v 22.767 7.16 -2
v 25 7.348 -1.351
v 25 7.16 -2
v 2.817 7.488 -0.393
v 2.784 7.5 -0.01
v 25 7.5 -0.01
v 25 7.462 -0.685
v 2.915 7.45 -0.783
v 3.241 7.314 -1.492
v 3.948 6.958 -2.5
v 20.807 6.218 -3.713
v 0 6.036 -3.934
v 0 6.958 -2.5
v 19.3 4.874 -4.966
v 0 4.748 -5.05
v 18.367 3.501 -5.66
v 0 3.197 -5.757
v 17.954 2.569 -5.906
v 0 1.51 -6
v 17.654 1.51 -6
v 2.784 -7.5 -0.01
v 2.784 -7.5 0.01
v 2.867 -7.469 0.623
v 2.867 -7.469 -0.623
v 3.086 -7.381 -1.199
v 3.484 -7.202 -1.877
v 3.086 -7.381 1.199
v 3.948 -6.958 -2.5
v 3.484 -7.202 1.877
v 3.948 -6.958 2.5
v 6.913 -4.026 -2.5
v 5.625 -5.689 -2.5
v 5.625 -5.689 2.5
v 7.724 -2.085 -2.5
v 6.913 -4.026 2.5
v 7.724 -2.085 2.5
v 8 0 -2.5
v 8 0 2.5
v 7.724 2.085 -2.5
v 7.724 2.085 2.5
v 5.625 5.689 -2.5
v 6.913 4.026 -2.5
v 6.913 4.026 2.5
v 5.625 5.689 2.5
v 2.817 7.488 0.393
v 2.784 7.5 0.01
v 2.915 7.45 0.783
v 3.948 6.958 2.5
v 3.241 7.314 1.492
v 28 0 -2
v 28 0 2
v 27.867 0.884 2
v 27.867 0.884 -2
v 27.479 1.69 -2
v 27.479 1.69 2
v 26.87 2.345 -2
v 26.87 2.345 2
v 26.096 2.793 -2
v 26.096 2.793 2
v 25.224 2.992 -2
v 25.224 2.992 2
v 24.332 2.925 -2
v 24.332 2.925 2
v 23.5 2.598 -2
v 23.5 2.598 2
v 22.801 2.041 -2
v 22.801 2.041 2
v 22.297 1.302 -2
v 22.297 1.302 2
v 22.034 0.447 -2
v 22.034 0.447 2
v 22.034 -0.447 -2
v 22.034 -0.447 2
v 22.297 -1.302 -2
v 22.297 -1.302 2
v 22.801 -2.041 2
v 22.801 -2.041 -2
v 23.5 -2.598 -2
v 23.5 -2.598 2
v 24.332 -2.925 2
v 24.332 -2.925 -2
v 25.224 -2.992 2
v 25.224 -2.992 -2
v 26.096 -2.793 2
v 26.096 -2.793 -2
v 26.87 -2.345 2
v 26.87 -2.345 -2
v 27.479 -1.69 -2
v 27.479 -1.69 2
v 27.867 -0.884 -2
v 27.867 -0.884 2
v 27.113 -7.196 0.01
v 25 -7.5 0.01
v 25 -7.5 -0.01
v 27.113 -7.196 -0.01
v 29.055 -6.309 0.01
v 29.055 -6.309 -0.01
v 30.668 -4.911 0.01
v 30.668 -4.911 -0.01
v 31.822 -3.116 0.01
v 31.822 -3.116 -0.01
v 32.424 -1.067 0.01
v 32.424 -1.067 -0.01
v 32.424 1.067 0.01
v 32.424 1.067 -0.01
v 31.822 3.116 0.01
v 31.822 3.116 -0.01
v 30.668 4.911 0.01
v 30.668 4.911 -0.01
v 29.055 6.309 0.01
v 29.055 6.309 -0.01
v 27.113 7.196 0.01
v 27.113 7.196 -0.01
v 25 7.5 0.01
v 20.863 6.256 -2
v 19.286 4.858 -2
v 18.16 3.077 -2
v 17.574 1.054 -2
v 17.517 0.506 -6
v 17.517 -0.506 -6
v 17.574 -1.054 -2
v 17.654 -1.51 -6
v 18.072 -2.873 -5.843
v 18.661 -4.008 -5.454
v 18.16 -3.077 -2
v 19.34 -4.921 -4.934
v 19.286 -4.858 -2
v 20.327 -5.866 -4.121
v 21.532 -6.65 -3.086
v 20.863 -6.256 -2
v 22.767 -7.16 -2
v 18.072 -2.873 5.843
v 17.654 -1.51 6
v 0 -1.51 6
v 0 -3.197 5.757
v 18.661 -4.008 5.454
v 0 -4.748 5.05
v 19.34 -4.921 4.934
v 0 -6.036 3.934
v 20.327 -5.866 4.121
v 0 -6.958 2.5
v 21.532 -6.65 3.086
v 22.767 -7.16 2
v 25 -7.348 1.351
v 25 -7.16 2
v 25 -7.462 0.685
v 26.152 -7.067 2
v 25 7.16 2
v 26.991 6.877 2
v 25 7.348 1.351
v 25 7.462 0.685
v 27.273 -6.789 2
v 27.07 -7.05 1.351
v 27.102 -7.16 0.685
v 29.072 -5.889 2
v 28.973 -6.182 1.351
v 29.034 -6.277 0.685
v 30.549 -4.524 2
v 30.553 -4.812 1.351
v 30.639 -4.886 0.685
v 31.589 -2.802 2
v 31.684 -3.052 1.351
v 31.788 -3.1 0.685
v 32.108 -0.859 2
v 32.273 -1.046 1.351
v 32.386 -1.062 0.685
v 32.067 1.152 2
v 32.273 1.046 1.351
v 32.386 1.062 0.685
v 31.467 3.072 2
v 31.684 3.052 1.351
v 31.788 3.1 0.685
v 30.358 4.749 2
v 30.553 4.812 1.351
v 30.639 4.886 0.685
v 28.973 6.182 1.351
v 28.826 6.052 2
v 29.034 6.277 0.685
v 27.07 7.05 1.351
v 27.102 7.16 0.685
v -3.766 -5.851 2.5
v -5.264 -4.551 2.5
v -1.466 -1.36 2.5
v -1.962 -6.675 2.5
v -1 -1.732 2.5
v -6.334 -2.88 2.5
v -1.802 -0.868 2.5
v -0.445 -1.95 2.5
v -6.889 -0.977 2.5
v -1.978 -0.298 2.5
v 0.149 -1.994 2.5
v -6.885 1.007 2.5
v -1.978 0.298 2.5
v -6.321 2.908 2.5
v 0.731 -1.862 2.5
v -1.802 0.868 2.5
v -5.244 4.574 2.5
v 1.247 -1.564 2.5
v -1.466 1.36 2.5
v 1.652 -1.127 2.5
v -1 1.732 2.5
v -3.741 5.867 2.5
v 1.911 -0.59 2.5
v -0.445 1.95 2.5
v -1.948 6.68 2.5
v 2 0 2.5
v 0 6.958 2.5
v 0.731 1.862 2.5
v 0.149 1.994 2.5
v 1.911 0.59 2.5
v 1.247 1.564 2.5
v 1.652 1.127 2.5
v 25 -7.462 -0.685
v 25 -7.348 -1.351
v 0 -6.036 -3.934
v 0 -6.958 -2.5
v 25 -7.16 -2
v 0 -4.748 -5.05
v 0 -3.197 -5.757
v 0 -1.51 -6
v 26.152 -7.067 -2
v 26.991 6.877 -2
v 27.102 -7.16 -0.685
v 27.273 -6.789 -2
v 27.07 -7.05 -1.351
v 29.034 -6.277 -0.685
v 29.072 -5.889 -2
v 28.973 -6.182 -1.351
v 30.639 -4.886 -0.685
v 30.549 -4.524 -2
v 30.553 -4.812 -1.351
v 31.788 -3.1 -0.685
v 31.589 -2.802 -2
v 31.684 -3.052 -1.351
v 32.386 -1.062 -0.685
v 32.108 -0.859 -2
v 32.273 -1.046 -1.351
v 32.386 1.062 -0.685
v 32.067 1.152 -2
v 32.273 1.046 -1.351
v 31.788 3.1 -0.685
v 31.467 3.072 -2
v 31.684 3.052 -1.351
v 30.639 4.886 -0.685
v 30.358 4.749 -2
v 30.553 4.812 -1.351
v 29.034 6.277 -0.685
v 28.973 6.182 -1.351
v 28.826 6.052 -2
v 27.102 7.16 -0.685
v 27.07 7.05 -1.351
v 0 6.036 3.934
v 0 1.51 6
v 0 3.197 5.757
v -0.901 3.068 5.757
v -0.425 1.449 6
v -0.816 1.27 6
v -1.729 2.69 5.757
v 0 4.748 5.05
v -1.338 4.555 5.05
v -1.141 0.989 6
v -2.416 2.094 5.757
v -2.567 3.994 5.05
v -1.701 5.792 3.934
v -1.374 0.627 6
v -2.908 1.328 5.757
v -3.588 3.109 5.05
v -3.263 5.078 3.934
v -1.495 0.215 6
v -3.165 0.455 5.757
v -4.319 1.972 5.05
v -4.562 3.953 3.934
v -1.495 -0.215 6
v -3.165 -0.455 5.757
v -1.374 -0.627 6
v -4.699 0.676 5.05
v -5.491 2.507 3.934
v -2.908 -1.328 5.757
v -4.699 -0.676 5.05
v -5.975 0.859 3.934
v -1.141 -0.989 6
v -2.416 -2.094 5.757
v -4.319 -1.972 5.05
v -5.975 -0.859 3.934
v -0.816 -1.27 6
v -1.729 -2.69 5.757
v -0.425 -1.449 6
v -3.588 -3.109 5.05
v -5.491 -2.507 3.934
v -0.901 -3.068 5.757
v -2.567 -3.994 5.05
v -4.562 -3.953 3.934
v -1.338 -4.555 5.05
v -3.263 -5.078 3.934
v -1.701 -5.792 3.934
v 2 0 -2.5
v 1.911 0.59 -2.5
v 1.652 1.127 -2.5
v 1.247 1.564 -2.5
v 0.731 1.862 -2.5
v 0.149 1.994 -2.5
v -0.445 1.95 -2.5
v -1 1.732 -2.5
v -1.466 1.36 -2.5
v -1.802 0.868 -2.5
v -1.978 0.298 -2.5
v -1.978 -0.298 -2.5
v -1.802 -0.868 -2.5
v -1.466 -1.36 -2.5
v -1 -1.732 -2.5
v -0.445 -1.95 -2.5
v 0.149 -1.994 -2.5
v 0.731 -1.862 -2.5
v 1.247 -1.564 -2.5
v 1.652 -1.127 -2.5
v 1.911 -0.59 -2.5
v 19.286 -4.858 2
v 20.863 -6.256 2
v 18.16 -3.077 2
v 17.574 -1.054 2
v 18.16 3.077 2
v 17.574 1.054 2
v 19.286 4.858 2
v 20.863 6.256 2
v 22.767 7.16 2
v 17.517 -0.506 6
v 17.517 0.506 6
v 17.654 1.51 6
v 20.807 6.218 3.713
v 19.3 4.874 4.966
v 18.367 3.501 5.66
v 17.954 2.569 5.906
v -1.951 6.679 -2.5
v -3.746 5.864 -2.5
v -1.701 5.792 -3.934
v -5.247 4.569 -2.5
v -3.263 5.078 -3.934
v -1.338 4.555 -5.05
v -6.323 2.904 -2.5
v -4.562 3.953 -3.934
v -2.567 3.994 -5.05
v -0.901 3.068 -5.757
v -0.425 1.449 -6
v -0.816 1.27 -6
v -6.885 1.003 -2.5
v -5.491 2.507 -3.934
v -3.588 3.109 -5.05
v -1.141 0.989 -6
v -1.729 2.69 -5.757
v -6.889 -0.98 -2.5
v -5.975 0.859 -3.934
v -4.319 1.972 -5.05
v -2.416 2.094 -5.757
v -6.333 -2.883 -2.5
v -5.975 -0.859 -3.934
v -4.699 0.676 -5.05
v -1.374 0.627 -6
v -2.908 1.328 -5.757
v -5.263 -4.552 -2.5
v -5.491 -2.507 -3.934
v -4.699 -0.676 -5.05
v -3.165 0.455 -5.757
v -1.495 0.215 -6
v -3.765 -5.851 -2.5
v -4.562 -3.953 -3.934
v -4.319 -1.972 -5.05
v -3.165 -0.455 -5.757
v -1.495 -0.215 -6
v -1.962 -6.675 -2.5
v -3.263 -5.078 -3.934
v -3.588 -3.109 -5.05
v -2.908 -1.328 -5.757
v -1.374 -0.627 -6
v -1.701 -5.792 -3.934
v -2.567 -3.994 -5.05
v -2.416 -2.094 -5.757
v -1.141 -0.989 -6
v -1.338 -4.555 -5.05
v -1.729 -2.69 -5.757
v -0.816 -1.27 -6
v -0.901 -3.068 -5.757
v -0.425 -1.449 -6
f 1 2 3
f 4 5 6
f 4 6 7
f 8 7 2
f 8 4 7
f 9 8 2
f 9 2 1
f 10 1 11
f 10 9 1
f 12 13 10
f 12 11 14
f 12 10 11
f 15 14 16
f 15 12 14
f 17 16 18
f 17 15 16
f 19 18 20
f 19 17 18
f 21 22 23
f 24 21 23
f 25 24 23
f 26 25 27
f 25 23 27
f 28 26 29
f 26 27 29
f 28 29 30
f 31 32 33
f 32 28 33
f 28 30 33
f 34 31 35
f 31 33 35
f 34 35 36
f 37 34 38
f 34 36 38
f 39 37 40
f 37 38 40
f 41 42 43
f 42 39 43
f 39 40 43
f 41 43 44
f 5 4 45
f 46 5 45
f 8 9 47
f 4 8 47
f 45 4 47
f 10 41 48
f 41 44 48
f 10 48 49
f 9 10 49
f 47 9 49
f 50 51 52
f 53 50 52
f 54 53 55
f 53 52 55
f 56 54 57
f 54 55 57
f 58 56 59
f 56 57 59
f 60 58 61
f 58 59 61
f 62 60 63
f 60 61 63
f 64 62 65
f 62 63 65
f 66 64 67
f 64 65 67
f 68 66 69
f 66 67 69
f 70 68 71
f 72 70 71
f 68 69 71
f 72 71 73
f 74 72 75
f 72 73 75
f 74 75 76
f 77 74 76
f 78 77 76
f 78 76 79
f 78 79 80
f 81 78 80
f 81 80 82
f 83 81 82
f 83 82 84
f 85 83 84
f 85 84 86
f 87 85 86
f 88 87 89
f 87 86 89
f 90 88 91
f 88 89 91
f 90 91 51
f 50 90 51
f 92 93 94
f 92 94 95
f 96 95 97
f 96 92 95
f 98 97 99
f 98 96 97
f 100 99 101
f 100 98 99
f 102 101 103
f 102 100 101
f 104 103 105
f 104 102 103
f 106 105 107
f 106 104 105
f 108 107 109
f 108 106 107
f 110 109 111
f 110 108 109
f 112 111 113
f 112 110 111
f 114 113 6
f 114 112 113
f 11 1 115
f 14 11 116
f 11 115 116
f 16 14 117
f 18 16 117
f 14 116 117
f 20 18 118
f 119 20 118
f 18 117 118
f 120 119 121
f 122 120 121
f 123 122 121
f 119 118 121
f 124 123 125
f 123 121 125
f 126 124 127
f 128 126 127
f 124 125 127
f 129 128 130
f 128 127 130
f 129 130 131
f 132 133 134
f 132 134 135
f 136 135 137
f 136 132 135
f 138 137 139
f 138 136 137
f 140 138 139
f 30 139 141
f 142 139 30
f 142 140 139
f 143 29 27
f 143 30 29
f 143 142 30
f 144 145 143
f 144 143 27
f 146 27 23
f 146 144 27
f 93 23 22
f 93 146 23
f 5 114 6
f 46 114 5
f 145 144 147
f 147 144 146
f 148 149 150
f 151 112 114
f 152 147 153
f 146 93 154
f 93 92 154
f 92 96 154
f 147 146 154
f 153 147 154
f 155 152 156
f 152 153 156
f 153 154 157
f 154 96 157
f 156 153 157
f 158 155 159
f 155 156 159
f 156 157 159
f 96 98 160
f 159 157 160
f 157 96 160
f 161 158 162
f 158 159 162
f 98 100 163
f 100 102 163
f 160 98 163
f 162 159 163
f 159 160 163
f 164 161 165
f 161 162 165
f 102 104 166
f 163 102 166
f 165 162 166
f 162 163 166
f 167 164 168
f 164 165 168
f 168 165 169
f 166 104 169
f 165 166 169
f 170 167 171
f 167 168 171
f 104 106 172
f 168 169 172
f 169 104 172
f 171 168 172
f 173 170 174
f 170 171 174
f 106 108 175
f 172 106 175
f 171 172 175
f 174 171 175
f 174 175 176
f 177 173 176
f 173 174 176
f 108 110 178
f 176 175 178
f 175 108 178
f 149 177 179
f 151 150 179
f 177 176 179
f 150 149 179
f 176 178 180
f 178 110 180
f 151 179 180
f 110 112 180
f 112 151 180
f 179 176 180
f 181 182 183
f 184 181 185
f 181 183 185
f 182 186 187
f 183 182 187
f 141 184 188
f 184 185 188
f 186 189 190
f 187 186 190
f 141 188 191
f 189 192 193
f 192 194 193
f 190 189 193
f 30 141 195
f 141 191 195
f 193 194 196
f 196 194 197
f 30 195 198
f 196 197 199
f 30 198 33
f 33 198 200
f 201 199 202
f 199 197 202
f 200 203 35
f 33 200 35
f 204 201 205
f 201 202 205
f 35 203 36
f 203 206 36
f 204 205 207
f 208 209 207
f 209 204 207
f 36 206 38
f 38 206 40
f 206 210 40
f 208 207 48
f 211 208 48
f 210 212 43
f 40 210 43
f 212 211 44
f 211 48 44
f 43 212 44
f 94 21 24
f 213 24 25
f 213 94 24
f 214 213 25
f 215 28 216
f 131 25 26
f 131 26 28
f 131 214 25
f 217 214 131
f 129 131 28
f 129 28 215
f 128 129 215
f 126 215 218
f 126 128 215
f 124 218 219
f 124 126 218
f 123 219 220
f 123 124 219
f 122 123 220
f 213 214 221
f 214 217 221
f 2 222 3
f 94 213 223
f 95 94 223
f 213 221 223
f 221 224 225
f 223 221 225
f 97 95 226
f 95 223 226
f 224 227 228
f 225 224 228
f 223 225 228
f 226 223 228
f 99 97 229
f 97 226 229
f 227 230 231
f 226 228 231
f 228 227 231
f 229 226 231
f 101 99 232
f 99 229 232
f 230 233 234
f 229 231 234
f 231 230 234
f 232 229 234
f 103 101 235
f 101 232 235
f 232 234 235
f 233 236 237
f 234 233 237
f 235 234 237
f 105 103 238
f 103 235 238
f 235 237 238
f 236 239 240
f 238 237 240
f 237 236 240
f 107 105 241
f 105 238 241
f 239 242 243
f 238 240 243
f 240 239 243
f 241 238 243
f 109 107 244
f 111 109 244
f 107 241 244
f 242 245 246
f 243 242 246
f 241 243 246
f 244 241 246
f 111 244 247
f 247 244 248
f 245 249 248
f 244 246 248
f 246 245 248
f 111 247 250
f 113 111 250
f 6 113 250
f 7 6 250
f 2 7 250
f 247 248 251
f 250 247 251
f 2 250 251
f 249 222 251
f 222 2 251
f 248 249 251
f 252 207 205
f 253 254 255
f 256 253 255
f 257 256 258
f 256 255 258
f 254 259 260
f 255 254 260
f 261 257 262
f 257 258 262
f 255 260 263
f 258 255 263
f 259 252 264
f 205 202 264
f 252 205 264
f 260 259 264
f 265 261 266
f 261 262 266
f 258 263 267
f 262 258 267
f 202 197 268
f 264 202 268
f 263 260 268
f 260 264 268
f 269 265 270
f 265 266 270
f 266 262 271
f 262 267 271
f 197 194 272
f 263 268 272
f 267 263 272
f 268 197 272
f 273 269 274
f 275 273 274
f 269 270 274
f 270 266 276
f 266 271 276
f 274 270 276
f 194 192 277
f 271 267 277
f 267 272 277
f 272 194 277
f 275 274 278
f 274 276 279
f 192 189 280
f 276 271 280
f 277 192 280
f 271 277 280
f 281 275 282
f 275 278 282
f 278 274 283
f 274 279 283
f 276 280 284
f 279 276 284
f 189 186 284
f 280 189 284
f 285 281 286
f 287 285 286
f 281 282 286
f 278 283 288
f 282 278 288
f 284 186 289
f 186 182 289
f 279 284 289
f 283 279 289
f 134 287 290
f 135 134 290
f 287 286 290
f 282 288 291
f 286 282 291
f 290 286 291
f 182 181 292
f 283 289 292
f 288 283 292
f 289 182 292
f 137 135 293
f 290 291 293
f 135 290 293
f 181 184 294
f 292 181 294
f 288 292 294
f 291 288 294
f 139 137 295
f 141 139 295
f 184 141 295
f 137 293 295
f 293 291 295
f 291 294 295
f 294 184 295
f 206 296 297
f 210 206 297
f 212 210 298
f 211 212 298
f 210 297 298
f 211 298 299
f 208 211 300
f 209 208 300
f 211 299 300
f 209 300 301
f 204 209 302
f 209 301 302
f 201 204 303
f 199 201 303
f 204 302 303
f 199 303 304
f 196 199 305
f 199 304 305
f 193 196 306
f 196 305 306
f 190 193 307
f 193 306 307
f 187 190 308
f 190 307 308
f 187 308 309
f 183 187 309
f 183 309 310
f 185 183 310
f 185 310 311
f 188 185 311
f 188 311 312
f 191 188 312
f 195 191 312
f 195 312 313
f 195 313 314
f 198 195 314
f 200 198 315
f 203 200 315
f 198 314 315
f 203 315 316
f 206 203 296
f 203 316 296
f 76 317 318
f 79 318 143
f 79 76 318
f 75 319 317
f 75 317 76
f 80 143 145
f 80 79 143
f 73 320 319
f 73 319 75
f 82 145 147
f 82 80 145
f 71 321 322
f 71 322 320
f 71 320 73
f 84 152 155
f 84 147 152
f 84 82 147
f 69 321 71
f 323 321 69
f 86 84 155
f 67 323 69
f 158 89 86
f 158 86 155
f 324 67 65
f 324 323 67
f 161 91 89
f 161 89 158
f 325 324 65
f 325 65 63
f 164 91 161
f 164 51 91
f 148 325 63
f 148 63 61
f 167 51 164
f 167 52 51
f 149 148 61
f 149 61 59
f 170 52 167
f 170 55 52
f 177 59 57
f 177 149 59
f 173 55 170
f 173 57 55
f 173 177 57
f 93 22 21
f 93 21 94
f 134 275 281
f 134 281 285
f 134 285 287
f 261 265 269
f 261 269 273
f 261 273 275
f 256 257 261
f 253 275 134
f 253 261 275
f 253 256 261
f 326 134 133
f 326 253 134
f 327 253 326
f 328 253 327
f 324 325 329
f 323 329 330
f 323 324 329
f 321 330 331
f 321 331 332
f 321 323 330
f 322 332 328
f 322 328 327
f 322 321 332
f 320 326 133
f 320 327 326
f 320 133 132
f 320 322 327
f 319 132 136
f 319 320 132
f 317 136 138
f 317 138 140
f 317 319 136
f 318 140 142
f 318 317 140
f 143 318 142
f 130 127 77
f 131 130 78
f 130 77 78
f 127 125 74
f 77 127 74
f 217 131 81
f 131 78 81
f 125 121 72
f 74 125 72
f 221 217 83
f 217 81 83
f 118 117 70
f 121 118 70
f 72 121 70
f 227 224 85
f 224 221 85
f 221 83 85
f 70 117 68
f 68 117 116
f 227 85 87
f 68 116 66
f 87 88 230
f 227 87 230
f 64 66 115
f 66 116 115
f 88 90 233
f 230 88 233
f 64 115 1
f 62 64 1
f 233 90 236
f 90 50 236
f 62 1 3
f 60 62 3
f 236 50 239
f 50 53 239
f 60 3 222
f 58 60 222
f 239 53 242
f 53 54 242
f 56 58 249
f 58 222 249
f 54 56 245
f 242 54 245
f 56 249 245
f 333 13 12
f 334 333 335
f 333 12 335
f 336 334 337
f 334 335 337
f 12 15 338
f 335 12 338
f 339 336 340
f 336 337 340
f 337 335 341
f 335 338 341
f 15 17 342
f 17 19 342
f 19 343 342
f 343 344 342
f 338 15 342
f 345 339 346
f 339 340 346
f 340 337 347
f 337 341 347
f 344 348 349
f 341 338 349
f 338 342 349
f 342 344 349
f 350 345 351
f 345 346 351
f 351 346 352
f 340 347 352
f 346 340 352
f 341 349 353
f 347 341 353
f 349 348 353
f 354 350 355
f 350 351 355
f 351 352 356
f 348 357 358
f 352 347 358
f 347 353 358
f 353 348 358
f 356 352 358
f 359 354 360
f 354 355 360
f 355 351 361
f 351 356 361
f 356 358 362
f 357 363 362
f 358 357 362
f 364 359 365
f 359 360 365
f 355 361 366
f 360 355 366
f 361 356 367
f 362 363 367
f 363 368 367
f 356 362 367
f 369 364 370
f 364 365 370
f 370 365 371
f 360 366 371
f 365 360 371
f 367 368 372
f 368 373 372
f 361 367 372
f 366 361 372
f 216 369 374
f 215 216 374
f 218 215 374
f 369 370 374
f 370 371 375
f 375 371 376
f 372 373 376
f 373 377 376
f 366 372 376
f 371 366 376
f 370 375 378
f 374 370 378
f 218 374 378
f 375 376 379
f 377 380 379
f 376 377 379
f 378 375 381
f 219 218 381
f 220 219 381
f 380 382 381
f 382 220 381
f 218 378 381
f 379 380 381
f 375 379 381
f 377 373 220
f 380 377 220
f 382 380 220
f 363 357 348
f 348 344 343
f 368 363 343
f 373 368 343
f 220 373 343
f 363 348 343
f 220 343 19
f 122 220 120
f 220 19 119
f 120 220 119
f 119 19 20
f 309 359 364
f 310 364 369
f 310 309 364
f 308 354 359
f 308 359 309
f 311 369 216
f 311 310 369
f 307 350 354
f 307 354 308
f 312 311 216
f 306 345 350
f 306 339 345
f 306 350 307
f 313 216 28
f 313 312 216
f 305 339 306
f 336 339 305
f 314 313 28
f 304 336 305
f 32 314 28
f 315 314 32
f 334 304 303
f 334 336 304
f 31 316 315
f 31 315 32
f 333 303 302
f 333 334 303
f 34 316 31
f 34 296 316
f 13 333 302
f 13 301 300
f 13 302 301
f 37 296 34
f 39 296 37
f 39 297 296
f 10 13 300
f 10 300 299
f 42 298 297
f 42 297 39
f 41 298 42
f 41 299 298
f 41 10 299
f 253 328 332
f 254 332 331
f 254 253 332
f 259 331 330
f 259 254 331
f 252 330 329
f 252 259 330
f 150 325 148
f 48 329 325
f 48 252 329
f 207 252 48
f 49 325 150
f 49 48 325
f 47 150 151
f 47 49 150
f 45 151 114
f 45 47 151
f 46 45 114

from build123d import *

# Parameters (mm, degrees)
PAD_DEPTH       = 6
FILLET_R        = 5.99
SKETCH001_R     = 8
POCKET_DEPTH    = 2.5
SKETCH002_R     = 7.5
POCKET001_DEPTH = 4.001
SKETCH003_R     = 7.5
POCKET002_DEPTH = 4.001
SKETCH004_R     = 3
POCKET003_DEPTH = 4
SKETCH005_R     = 2
PAD001_DEPTH    = 5


with BuildPart() as part:
    # Sketch → Pad (new body, symmetric)
    with BuildSketch(Plane.XY):
        with BuildLine():
            ThreePointArc((0, 7.5), (-7.5, 0), (0, -7.5))
            Line((0, -7.5), (25, -7.5))
            ThreePointArc((25, -7.5), (32.5, 0), (25, 7.5))
            Line((25, 7.5), (0, 7.5))
        make_face()
    extrude(amount=PAD_DEPTH, both=True)

    # Fillet
    fillet_edges = [part.edges().sort_by_distance(p)[0] for p in [
        (0, -7.5, 0),
        (25, -7.5, 0),
        (12.5, -7.5, -6),
        (12.5, -7.5, 6),
    ]]
    fillet(fillet_edges, radius=FILLET_R)

    # Sketch001 → Pocket (cut, symmetric)
    with BuildSketch(Plane.XY):
        Circle(SKETCH001_R)
    extrude(amount=POCKET_DEPTH, both=True, mode=Mode.SUBTRACT)

    # Sketch002 → Pocket001 (cut, through all)
    with BuildSketch(Plane.XY.offset(2)):
        with Locations((25, 0)):
            Circle(SKETCH002_R)
    extrude(amount=POCKET001_DEPTH, mode=Mode.SUBTRACT)

    # Sketch003 → Pocket002 (cut, through all)
    with BuildSketch(Plane.XY.offset(-2)):
        with Locations((25, 0)):
            Circle(SKETCH003_R)
    extrude(amount=-POCKET002_DEPTH, mode=Mode.SUBTRACT)

    # Sketch004 (on Face17 of Pocket002) → Pocket003 (cut)
    with BuildSketch(Plane.XY.offset(2)):
        with Locations((25, 0)):
            Circle(SKETCH004_R)
    extrude(amount=-POCKET003_DEPTH, mode=Mode.SUBTRACT)

    # Sketch005 (on Face6 of Pocket003) → Pad001 (join)
    with BuildSketch(Plane.XY.offset(-2.5)):
        Circle(SKETCH005_R)
    extrude(amount=PAD001_DEPTH)


solid = part.part
